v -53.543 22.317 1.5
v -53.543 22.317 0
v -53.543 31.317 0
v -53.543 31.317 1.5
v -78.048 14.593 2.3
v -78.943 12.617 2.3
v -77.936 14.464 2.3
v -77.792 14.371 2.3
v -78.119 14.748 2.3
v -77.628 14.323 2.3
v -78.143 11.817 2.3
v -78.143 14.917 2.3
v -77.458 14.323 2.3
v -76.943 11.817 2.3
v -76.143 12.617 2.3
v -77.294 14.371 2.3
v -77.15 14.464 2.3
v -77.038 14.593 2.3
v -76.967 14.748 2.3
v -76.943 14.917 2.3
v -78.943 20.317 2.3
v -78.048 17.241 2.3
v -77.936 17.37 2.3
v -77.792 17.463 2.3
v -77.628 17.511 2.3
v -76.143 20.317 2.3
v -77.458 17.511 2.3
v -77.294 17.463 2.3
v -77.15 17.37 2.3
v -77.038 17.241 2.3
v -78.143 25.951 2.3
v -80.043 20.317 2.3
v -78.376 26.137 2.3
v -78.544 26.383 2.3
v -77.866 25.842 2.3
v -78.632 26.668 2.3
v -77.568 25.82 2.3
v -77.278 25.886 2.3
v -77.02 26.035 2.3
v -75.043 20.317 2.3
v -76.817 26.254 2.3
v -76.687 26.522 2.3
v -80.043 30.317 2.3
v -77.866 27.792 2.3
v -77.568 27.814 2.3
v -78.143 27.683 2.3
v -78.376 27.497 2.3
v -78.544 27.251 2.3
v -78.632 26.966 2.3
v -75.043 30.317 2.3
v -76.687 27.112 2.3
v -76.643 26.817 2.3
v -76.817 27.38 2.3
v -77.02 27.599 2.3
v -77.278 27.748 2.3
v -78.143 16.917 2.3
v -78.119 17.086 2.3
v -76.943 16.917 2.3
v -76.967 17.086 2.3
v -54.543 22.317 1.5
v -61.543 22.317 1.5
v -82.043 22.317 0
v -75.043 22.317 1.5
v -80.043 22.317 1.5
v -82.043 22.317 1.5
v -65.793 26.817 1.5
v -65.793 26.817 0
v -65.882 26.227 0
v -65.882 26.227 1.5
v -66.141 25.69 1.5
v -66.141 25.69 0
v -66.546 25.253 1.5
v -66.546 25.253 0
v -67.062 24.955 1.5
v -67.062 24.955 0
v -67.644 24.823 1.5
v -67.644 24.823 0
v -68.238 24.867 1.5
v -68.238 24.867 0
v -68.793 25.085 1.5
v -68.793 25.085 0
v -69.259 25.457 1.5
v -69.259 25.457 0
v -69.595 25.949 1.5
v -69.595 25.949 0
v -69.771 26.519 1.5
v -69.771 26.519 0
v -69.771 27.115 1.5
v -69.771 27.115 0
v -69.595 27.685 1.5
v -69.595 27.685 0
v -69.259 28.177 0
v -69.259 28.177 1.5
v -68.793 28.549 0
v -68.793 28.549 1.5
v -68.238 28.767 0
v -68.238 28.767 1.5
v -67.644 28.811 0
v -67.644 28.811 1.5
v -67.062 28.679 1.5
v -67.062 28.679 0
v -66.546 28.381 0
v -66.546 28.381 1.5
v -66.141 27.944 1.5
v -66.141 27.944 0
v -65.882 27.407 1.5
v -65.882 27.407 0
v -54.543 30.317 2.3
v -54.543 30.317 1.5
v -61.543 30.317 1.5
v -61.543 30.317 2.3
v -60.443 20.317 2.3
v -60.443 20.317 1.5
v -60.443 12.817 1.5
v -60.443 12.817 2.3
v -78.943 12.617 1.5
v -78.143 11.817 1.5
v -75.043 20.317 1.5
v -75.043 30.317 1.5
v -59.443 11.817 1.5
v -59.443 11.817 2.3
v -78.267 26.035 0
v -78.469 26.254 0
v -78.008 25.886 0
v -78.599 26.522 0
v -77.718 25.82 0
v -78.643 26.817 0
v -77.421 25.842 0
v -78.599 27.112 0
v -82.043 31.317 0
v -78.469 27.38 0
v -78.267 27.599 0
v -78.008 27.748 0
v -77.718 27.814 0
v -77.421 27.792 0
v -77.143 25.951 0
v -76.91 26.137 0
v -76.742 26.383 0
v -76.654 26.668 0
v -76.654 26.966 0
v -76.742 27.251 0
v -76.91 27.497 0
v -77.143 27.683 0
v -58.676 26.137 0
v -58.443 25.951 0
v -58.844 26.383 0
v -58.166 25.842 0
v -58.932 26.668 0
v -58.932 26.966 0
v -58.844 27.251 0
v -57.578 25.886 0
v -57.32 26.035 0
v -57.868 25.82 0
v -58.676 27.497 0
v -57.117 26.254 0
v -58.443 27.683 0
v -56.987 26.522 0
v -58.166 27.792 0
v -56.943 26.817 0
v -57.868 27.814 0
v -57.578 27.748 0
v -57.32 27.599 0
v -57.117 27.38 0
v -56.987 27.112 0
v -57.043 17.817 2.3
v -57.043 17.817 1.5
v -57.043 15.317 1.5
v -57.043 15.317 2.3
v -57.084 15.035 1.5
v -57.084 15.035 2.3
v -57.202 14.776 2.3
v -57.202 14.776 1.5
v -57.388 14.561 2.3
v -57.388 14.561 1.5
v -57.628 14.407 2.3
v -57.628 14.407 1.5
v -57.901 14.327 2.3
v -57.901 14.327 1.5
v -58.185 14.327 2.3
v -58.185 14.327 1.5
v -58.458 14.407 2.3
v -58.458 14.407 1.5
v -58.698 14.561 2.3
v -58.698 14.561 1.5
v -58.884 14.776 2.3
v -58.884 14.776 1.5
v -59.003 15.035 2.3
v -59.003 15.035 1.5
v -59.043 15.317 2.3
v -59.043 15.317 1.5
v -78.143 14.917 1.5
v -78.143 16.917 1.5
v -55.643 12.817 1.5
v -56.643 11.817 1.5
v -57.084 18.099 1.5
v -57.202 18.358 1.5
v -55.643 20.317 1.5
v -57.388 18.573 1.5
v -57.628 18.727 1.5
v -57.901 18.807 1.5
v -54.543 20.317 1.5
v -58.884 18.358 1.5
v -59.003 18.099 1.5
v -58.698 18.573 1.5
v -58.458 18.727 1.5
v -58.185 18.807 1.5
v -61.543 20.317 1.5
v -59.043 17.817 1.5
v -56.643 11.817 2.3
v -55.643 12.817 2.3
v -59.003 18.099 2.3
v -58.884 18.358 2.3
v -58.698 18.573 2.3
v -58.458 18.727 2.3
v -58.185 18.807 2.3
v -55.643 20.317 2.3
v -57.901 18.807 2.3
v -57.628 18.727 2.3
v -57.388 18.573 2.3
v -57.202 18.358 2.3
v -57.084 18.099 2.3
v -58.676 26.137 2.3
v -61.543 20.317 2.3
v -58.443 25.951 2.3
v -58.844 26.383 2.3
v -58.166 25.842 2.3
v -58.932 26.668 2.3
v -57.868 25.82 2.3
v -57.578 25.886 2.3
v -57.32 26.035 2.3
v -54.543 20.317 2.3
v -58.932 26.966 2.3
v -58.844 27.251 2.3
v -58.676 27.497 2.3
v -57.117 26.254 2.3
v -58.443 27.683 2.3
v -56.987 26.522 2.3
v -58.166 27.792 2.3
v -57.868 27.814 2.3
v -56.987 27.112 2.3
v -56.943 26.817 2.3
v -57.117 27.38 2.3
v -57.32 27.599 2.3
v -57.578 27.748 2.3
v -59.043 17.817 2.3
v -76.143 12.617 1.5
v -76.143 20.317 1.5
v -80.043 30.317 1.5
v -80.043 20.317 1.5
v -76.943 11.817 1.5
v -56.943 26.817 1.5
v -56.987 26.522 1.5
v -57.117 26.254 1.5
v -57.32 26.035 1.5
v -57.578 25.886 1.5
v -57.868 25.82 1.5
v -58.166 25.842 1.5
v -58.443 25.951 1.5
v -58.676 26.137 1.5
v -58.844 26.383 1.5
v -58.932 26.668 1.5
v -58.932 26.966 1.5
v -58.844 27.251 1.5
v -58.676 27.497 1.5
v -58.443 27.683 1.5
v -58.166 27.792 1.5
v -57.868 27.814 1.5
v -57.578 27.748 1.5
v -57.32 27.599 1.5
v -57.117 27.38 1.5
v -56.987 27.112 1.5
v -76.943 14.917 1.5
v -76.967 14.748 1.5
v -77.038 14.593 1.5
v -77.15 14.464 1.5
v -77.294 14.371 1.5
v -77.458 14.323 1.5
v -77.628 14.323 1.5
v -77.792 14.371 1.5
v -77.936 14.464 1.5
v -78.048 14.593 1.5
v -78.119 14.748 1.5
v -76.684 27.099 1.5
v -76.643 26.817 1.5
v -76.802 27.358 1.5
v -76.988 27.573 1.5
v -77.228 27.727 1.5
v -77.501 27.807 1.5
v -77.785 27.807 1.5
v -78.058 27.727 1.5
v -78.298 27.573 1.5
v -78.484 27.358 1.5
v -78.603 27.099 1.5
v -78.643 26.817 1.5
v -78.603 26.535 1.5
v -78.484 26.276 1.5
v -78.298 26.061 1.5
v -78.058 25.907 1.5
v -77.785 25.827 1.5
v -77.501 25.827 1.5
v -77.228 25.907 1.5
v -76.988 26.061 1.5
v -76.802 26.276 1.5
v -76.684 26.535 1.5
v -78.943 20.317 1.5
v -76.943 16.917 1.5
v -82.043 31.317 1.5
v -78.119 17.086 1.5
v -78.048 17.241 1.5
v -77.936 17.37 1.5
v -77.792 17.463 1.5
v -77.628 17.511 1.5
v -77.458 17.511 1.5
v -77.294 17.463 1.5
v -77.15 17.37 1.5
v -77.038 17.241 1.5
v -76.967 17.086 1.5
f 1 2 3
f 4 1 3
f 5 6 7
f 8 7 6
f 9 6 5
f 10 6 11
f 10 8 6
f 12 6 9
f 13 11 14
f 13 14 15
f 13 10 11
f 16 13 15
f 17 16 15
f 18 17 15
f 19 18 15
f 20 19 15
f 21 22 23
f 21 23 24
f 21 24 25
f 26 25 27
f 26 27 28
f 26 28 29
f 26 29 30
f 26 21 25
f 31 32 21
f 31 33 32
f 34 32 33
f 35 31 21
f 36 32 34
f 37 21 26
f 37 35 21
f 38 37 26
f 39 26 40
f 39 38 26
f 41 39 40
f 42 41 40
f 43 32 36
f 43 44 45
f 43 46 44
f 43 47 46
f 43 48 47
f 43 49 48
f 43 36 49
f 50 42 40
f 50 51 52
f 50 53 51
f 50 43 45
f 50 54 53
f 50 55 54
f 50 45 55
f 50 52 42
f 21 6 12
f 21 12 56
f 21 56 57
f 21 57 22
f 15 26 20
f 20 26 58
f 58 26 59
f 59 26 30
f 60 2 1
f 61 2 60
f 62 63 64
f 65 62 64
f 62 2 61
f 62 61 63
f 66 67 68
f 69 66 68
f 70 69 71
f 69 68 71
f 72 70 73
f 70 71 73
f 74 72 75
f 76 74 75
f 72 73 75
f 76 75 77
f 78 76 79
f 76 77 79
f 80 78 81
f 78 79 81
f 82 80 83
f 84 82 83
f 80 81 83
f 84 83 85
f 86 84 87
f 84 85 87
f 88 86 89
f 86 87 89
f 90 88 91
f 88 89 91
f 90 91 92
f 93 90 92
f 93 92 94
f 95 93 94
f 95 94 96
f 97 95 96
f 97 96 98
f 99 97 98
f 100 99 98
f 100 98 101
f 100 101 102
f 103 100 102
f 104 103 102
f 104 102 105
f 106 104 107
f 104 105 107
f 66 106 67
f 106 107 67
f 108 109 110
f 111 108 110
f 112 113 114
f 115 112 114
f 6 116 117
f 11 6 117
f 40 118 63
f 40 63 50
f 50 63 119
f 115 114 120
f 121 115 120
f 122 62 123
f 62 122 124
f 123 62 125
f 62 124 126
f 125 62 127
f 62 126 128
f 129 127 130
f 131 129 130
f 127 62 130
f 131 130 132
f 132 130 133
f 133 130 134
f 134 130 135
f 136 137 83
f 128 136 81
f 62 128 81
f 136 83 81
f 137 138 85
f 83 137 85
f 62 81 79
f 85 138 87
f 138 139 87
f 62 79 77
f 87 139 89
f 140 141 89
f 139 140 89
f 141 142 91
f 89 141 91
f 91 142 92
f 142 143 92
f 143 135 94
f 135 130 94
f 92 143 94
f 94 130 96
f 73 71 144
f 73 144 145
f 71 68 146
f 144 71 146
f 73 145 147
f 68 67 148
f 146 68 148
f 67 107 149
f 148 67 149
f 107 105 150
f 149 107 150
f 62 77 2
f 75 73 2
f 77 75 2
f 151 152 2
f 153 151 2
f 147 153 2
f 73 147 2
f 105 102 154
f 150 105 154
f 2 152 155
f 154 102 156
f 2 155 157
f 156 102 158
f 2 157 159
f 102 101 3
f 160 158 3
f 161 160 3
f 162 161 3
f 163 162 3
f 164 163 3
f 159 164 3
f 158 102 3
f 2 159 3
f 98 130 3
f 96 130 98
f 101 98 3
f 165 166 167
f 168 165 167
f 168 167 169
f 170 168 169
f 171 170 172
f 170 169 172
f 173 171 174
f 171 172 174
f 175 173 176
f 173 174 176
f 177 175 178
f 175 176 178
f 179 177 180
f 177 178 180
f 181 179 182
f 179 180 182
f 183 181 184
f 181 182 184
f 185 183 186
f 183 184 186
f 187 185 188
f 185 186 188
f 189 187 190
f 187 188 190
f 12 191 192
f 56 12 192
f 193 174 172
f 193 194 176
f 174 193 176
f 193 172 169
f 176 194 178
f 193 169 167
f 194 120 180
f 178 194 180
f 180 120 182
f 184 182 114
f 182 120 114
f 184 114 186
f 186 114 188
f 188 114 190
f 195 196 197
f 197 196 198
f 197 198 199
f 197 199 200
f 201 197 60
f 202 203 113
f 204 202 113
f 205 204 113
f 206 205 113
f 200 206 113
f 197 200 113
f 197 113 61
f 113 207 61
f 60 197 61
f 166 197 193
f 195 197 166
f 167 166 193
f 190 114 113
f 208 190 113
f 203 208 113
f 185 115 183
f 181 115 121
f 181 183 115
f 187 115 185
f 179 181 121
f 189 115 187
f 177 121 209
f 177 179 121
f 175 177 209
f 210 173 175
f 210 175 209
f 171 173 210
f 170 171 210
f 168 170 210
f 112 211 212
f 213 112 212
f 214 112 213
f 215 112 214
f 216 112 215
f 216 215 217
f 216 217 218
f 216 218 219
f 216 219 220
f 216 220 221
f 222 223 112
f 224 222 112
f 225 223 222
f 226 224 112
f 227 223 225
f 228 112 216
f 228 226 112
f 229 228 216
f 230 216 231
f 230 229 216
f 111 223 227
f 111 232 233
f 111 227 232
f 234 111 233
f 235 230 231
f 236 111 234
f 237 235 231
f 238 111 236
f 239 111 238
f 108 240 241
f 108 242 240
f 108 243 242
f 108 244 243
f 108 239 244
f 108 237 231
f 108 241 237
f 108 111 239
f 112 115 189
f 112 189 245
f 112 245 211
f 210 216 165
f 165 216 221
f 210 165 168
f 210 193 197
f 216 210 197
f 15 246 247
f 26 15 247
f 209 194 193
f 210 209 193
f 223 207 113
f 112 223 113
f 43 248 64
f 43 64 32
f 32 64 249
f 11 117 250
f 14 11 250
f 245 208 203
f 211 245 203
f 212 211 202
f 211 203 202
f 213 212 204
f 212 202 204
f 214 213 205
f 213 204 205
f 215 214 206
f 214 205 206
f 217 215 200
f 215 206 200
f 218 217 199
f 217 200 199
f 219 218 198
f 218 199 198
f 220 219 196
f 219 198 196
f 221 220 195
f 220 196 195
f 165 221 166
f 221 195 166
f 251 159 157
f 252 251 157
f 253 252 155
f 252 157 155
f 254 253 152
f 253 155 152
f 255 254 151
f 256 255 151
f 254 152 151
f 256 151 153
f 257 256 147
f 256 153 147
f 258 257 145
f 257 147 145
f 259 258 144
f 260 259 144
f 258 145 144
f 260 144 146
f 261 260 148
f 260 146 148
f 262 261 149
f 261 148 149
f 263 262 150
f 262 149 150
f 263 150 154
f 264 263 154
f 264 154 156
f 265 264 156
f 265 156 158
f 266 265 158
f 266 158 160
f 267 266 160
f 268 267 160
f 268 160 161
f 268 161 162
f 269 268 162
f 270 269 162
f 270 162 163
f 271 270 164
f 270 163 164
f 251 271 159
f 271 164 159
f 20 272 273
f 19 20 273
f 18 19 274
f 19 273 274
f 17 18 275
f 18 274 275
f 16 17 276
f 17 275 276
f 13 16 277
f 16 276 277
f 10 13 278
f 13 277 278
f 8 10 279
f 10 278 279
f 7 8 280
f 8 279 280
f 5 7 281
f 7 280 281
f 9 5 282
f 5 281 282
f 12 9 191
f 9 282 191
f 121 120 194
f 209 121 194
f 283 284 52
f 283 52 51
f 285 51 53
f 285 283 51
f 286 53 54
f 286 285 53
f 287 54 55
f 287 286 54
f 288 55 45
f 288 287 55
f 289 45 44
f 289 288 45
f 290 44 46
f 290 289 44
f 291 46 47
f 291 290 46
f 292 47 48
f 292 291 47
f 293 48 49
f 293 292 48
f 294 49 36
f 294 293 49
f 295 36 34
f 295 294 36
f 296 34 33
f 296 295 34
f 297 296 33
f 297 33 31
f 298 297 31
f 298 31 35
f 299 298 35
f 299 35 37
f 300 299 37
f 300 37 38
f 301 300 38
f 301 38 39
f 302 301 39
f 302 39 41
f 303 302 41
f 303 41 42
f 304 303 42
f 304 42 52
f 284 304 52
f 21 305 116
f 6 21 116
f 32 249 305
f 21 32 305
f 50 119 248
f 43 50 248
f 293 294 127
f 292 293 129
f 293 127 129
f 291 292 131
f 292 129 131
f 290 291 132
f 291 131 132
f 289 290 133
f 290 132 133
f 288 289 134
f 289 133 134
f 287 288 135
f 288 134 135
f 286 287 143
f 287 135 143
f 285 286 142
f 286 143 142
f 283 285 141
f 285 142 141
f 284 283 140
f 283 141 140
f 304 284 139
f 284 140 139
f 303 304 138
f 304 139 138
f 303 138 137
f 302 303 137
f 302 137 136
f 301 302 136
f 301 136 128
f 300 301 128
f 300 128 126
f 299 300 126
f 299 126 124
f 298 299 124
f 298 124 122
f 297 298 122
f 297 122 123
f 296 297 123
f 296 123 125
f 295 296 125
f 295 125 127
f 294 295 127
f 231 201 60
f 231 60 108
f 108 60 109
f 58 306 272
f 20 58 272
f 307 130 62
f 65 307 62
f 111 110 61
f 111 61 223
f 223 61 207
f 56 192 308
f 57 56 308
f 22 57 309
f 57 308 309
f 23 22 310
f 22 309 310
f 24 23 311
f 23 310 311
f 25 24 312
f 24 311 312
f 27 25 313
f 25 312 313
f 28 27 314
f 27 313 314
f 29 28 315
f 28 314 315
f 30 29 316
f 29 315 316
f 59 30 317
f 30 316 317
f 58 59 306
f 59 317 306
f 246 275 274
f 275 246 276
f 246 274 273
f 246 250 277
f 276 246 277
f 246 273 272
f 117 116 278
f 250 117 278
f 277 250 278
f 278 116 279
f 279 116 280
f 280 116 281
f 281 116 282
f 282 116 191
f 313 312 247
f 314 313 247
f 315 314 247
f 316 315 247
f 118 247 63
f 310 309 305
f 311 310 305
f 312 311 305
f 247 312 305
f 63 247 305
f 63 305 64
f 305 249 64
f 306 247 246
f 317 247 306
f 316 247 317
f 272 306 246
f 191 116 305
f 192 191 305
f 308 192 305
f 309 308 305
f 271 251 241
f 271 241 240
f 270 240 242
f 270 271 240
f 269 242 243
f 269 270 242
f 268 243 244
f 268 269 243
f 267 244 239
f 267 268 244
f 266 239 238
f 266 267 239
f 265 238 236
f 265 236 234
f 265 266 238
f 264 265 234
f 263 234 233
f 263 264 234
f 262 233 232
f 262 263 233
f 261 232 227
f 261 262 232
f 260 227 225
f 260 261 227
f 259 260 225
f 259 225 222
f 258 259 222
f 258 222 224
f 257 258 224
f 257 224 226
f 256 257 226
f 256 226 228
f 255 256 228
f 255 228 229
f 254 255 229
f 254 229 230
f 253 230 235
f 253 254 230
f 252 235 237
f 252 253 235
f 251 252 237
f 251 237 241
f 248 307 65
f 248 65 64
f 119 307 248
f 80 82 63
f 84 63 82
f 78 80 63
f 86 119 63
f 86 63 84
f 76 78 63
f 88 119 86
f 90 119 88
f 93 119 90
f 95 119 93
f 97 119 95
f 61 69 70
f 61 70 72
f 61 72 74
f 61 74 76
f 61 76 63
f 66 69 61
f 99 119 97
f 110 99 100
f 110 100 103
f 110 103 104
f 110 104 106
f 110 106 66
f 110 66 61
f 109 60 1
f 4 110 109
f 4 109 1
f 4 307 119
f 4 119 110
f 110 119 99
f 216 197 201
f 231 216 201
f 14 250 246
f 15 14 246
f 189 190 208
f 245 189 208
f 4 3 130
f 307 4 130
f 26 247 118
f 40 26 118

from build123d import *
from build123d.topology import SkipClean

# Parameters (mm, degrees)
ESQUISSE1_W             = 7
ESQUISSE1_H             = 8
ESQUISSE1_W_2           = 5
BOSS_EXTRU_1_DEPTH      = 1.5
ESQUISSE2_R             = 1
BOSS_EXTRU_2_DEPTH      = 0.8
ESQUISSE3_W             = 1.5
ESQUISSE3_H             = 10.5
ENL_V_MAT_EXTRU_1_DEPTH = 28.5


with BuildPart() as part:
    # Esquisse1 → Boss.-Extru.1 (new body)
    # profile 1 of 5: a face of its own
    with BuildSketch(Plane.XY):
        Polygon((-54.543024121, 30.316995205), (-54.543024121, 22.316995205), (-53.543024121, 22.316995205), (-53.543024121, 31.316995205), (-82.043024121, 31.316995205), (-82.043024121, 22.316995205), (-80.043024121, 22.316995205), (-80.043024121, 30.316995205), (-75.043024121, 30.316995205), (-75.043024121, 22.316995205), (-61.543024121, 22.316995205), (-61.543024121, 30.316995205), align=None)
        with BuildLine():
            ThreePointArc((-69.793024121, 26.816995205), (-67.793024121, 28.816995205), (-65.793024121, 26.816995205))
            ThreePointArc((-65.793024121, 26.816995205), (-67.793024121, 24.816995205), (-69.793024121, 26.816995205))
        make_face(mode=Mode.SUBTRACT)
    # profile 2 of 5: a face of its own
    with BuildSketch(Plane.XY):
        Polygon((-55.643024121, 20.316995205), (-54.543024121, 20.316995205), (-54.543024121, 22.316995205), (-61.543024121, 22.316995205), (-61.543024121, 20.316995205), (-60.443024121, 20.316995205), (-60.443024121, 12.816995205), (-59.443024121, 11.816995205), (-56.643024121, 11.816995205), (-55.643024121, 12.816995205), align=None)
        with BuildLine():
            ThreePointArc((-59.043024121, 17.816995205), (-58.043024121, 18.816995205), (-57.043024121, 17.816995205))
            Line((-57.043024121, 17.816995205), (-57.043024121, 15.316995205))
            ThreePointArc((-57.043024121, 15.316995205), (-58.043024121, 14.316995205), (-59.043024121, 15.316995205))
            Line((-59.043024121, 15.316995205), (-59.043024121, 17.816995205))
        make_face(mode=Mode.SUBTRACT)
    # profile 3 of 5: a face of its own
    with BuildSketch(Plane.XY):
        Polygon((-75.043024121, 20.316995205), (-75.043024121, 22.316995205), (-80.043024121, 22.316995205), (-80.043024121, 20.316995205), (-78.943024121, 20.316995205), (-78.943024121, 12.616995205), (-78.143024121, 11.816995205), (-76.943024121, 11.816995205), (-76.143024121, 12.616995205), (-76.143024121, 20.316995205), align=None)
        with BuildLine():
            ThreePointArc((-78.143024121, 16.916995205), (-77.543024121, 17.516995205), (-76.943024121, 16.916995205))
            Line((-76.943024121, 16.916995205), (-76.943024121, 14.916995205))
            ThreePointArc((-76.943024121, 14.916995205), (-77.543024121, 14.316995205), (-78.143024121, 14.916995205))
            Line((-78.143024121, 14.916995205), (-78.143024121, 16.916995205))
        make_face(mode=Mode.SUBTRACT)
    # profile 4 of 5: a face of its own
    with BuildSketch(Plane.XY):
        with Locations((-58.043024121, 26.316995205)):
            Rectangle(ESQUISSE1_W, ESQUISSE1_H)
        with BuildLine():
            ThreePointArc((-58.943024121, 26.816995205), (-57.943024121, 27.816995205), (-56.943024121, 26.816995205))
            ThreePointArc((-56.943024121, 26.816995205), (-57.943024121, 25.816995205), (-58.943024121, 26.816995205))
        make_face(mode=Mode.SUBTRACT)
    # profile 5 of 5: a face of its own
    with BuildSketch(Plane.XY):
        with Locations((-77.543024121, 26.316995205)):
            Rectangle(ESQUISSE1_W_2, ESQUISSE1_H)
        with BuildLine():
            ThreePointArc((-76.643024121, 26.816995205), (-77.643024121, 25.816995205), (-78.643024121, 26.816995205))
            ThreePointArc((-78.643024121, 26.816995205), (-77.643024121, 27.816995205), (-76.643024121, 26.816995205))
        make_face(mode=Mode.SUBTRACT)
    extrude(amount=BOSS_EXTRU_1_DEPTH)

    # Esquisse2 → Boss.-Extru.2 (add)
    # profile 1 of 2: a face of its own
    with SkipClean():  # the faces are left unmerged after this step: merging them gives an invalid solid
        with BuildSketch(Plane.XY.offset(1.5)):
            Polygon((-80.043024121, 22.316995205), (-80.043024121, 20.316995205), (-78.943024121, 20.316995205), (-78.943024121, 12.616995205), (-78.143024121, 11.816995205), (-76.943024121, 11.816995205), (-76.143024121, 12.616995205), (-76.143024121, 20.316995205), (-75.043024121, 20.316995205), (-75.043024121, 22.316995205), (-75.043024121, 30.316995205), (-80.043024121, 30.316995205), align=None)
            with BuildLine():
                ThreePointArc((-78.143024121, 16.916995205), (-77.543024121, 17.516995205), (-76.943024121, 16.916995205))
                Line((-76.943024121, 16.916995205), (-76.943024121, 14.916995205))
                ThreePointArc((-76.943024121, 14.916995205), (-77.543024121, 14.316995205), (-78.143024121, 14.916995205))
                Line((-78.143024121, 14.916995205), (-78.143024121, 16.916995205))
            make_face(mode=Mode.SUBTRACT)
            with Locations((-77.643024121, 26.816995205)):
                Circle(ESQUISSE2_R, mode=Mode.SUBTRACT)
        # profile 2 of 2: a face of its own
        with BuildSketch(Plane.XY.offset(1.5)):
            Polygon((-61.543024121, 22.316995205), (-61.543024121, 20.316995205), (-60.443024121, 20.316995205), (-60.443024121, 12.816995205), (-59.443024121, 11.816995205), (-56.643024121, 11.816995205), (-55.643024121, 12.816995205), (-55.643024121, 20.316995205), (-54.543024121, 20.316995205), (-54.543024121, 22.316995205), (-54.543024121, 30.316995205), (-61.543024121, 30.316995205), align=None)
            with BuildLine():
                ThreePointArc((-59.043024121, 17.816995205), (-58.043024121, 18.816995205), (-57.043024121, 17.816995205))
                Line((-57.043024121, 17.816995205), (-57.043024121, 15.316995205))
                ThreePointArc((-57.043024121, 15.316995205), (-58.043024121, 14.316995205), (-59.043024121, 15.316995205))
                Line((-59.043024121, 15.316995205), (-59.043024121, 17.816995205))
            make_face(mode=Mode.SUBTRACT)
            with Locations((-57.943024121, 26.816995205)):
                Circle(ESQUISSE2_R, mode=Mode.SUBTRACT)
        extrude(amount=BOSS_EXTRU_2_DEPTH)

    # Esquisse3 → Enlèv. mat.-Extru.1 (cut)
    with SkipClean():  # the faces are left unmerged after this step: merging them gives an invalid solid
        with BuildSketch(Plane.ZY.offset(82.043024121)):
            with Locations((0.75, 17.066995205)):
                Rectangle(ESQUISSE3_W, ESQUISSE3_H)
        extrude(amount=-ENL_V_MAT_EXTRU_1_DEPTH, mode=Mode.SUBTRACT)
    add(part.part.scale(1), mode=Mode.REPLACE)  # the faces are merged on a copy


solid = part.part
